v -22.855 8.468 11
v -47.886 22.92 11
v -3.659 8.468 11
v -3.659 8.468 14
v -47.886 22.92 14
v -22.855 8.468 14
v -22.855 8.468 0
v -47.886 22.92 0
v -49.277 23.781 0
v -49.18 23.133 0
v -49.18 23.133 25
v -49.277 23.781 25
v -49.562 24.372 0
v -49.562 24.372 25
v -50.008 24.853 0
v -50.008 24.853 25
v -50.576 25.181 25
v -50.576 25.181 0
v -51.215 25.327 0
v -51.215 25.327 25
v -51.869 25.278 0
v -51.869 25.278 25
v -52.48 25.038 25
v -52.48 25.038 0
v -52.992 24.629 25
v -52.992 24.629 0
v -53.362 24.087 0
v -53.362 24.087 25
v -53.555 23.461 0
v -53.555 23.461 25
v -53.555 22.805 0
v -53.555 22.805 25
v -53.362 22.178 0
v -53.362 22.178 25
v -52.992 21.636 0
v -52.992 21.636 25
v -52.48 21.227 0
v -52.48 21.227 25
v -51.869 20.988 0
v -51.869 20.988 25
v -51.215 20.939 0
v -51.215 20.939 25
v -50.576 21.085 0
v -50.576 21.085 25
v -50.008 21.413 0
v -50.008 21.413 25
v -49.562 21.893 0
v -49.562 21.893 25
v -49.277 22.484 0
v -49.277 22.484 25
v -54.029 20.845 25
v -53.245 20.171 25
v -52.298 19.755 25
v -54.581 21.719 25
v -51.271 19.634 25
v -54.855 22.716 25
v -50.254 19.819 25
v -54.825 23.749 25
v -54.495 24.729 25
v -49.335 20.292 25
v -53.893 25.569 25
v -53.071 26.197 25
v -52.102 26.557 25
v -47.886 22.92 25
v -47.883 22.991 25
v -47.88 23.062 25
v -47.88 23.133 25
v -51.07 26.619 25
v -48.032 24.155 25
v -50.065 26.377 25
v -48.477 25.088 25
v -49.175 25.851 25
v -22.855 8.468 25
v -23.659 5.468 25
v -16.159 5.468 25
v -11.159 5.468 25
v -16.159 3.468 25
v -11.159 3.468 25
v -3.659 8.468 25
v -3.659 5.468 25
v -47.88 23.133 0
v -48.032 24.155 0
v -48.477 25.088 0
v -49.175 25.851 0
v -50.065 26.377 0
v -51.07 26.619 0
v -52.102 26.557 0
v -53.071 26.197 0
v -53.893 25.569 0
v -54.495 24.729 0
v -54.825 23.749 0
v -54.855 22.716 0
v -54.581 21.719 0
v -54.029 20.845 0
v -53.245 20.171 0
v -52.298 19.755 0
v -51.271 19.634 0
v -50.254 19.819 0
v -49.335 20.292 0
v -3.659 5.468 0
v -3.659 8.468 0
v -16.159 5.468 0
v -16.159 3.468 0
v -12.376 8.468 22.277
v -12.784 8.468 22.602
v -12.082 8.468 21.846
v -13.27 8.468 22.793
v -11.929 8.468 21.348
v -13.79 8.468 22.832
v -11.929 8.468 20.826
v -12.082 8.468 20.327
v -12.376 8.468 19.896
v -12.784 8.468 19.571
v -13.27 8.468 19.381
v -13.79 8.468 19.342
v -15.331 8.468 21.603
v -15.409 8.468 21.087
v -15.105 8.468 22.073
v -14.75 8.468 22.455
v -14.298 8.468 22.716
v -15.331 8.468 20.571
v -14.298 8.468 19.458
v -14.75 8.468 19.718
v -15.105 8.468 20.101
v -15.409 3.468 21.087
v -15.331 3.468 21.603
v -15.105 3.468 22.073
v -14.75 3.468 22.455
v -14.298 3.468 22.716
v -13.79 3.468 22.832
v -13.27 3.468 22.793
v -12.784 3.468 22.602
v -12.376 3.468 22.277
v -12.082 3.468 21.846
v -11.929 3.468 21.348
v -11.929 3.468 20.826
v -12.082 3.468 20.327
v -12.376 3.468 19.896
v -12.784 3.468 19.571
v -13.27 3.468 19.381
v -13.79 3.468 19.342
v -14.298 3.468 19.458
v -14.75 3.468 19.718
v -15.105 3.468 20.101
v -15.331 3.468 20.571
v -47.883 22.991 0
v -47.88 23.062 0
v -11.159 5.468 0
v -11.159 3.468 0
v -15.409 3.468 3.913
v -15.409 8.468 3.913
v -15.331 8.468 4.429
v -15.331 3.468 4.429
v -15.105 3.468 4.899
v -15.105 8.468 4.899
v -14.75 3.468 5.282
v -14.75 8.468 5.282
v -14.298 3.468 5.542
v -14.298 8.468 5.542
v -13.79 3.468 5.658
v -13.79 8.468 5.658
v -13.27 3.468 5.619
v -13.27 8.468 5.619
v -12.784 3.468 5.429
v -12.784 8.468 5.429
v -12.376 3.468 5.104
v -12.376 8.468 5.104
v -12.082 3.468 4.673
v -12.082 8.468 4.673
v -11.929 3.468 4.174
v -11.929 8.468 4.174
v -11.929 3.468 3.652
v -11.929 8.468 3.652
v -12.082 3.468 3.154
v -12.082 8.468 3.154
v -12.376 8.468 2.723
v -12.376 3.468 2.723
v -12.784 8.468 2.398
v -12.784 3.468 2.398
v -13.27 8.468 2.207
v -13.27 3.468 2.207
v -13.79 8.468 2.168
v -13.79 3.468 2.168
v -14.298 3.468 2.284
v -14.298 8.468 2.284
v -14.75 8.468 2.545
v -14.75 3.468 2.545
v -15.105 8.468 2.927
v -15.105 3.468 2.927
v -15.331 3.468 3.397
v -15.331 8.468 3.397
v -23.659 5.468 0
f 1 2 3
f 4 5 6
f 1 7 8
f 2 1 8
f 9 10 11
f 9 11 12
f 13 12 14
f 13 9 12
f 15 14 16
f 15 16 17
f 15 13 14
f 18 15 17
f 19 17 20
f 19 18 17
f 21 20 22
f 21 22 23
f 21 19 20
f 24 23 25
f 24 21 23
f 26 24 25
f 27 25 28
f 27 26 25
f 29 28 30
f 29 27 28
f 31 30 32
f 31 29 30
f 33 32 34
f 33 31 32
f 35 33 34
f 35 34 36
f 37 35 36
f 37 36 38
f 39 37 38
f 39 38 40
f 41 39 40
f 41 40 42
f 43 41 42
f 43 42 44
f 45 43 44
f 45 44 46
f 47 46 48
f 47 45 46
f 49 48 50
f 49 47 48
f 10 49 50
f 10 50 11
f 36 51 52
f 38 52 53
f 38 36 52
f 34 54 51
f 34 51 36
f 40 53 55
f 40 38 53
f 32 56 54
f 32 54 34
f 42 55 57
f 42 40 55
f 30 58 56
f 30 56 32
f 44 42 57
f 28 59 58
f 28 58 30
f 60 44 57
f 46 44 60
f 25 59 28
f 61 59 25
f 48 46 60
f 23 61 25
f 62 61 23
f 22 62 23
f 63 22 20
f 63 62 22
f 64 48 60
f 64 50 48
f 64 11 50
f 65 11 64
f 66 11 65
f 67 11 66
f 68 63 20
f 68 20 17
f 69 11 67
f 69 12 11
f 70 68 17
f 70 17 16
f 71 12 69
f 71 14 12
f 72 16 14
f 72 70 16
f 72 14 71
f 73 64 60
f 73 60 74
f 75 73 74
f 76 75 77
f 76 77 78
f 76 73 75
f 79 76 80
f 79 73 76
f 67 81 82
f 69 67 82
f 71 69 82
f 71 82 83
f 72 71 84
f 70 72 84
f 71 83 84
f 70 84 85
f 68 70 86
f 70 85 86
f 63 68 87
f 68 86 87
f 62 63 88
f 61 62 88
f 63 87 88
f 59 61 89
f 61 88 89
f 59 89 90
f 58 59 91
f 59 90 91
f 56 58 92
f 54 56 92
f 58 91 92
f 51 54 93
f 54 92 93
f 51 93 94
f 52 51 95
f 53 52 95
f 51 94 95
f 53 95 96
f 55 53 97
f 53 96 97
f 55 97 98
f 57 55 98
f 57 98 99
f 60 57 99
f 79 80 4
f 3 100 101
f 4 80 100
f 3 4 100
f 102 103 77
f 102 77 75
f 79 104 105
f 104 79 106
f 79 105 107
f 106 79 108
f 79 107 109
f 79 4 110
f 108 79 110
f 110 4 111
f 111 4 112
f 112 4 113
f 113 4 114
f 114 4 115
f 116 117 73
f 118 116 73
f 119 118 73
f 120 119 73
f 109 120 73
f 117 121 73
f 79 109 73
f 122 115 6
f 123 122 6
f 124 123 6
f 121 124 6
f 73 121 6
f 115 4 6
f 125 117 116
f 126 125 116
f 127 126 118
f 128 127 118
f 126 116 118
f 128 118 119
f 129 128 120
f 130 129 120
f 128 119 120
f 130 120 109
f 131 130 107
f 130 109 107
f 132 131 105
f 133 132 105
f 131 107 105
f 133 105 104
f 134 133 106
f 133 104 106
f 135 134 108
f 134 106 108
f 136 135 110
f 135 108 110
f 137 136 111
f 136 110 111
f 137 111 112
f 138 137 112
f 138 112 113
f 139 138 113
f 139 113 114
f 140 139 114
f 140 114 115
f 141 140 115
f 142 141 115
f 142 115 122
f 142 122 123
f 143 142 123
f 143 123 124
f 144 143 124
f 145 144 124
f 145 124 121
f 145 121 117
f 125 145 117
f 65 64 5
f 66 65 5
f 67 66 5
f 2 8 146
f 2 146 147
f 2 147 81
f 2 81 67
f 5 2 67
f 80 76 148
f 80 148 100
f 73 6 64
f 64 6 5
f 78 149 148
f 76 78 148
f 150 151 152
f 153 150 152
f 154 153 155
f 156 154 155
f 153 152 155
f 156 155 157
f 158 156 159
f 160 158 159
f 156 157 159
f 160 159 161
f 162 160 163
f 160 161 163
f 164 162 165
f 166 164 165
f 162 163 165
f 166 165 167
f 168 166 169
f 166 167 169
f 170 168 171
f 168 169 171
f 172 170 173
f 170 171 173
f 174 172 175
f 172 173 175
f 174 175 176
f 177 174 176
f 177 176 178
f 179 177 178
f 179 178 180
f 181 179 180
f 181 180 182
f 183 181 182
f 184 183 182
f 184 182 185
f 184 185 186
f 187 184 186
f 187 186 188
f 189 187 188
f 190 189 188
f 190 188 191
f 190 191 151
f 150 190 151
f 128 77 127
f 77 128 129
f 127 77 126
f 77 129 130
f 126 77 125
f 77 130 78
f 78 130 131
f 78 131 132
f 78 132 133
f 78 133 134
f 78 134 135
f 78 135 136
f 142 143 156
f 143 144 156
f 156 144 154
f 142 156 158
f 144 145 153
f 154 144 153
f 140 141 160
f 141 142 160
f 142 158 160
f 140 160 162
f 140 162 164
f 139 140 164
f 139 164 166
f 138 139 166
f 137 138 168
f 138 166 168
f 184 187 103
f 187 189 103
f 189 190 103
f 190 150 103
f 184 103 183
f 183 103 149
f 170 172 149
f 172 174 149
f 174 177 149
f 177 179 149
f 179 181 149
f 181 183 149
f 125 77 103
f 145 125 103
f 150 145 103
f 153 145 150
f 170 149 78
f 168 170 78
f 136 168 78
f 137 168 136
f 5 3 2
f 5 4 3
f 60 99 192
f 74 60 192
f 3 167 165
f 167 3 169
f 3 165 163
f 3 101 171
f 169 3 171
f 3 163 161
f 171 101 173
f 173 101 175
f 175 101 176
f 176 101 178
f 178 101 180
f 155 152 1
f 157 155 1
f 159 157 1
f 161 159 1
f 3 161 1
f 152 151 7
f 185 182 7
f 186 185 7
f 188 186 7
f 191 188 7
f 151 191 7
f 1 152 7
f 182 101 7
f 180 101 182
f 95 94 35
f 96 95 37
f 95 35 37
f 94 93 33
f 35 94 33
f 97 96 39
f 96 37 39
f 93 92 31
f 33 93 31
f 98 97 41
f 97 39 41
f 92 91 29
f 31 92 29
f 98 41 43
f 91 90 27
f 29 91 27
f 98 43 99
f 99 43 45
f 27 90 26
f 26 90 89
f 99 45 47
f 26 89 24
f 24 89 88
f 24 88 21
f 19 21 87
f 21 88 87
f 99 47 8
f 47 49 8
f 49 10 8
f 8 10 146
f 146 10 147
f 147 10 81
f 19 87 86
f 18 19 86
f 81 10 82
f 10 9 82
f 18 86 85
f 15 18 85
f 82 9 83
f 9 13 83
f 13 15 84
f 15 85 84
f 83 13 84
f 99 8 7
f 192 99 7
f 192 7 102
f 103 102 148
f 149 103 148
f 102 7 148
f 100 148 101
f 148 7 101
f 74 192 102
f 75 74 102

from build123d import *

# Parameters (mm, degrees)
F0_R          = 2.2
F0_W          = 5
F0_H          = 2
F1_DEPTH      = 25
F4_DEPTH      = 1.5
F4_DEPTH_BACK = 1.5
F5_R          = 1.75
F6_DEPTH      = 25


with BuildPart() as f1:
    # F0 (on Top) → F1 (new body)
    with BuildSketch(Plane.XY):
        with BuildLine():
            Line((-48.139875, 23.066107), (-47.886185, 22.919639))
            ThreePointArc((-47.886185, 22.919639), (-47.881315, 23.026134), (-47.879692, 23.132728))
            ThreePointArc((-47.879692, 23.132728), (-54.494673, 24.728627), (-49.33506, 20.292046))
            Line((-49.33506, 20.292046), (-49.639875, 20.468031))
            Line((-49.639875, 20.468031), (-48.139875, 23.066107))
        make_face()
        with Locations((-51.379692, 23.132728)):
            Circle(F0_R, mode=Mode.SUBTRACT)
        with BuildLine():
            ThreePointArc((-49.33506, 20.292046), (-48.31476, 21.442701), (-47.886185, 22.919639))
            Line((-47.886185, 22.919639), (-48.139875, 23.066107))
            Line((-48.139875, 23.066107), (-49.639875, 20.468031))
            Line((-49.639875, 20.468031), (-49.33506, 20.292046))
        make_face()
        with BuildLine():
            Line((-23.659113, 5.468031), (-23.659113, 8.468031))
            Line((-23.659113, 8.468031), (-22.855266, 8.468031))
            Line((-22.855266, 8.468031), (-47.886185, 22.919639))
            ThreePointArc((-47.886185, 22.919639), (-48.31476, 21.442701), (-49.33506, 20.292046))
            Line((-49.33506, 20.292046), (-23.659113, 5.468031))
        make_face()
        with Locations((-13.659113, 4.468031)):
            Rectangle(F0_W, F0_H)
        Polygon((-3.659113, 8.468031), (-22.855266, 8.468031), (-22.159113, 8.066107), (-23.659113, 5.468031), (-16.159113, 5.468031), (-11.159113, 5.468031), (-3.659113, 5.468031), align=None)
        Polygon((-22.855266, 8.468031), (-23.659113, 8.468031), (-23.659113, 5.468031), (-22.159113, 8.066107), align=None)
    extrude(amount=F1_DEPTH)

    # F3 (on offset) → F4 (join, two sides)
    with BuildSketch(Plane.XY.offset(12.5)) as f4_sk:
        Polygon((-3.659113, 8.468031), (-47.886185, 22.919639), (-22.855266, 8.468031), align=None)
    extrude(amount=F4_DEPTH)
    extrude(f4_sk.sketch, amount=-F4_DEPTH_BACK)

    # F5 (on face) → F6 (cut)
    with BuildSketch(Plane(origin=(0, 8.468031, 0), x_dir=(-1, 0, 0), z_dir=(0, 1, 0))):
        with Locations((13.659113, 3.913301)):
            Circle(F5_R)
        with Locations((13.659113, 21.086699)):
            Circle(F5_R)
    extrude(amount=-F6_DEPTH, mode=Mode.SUBTRACT)


solid = f1.part
